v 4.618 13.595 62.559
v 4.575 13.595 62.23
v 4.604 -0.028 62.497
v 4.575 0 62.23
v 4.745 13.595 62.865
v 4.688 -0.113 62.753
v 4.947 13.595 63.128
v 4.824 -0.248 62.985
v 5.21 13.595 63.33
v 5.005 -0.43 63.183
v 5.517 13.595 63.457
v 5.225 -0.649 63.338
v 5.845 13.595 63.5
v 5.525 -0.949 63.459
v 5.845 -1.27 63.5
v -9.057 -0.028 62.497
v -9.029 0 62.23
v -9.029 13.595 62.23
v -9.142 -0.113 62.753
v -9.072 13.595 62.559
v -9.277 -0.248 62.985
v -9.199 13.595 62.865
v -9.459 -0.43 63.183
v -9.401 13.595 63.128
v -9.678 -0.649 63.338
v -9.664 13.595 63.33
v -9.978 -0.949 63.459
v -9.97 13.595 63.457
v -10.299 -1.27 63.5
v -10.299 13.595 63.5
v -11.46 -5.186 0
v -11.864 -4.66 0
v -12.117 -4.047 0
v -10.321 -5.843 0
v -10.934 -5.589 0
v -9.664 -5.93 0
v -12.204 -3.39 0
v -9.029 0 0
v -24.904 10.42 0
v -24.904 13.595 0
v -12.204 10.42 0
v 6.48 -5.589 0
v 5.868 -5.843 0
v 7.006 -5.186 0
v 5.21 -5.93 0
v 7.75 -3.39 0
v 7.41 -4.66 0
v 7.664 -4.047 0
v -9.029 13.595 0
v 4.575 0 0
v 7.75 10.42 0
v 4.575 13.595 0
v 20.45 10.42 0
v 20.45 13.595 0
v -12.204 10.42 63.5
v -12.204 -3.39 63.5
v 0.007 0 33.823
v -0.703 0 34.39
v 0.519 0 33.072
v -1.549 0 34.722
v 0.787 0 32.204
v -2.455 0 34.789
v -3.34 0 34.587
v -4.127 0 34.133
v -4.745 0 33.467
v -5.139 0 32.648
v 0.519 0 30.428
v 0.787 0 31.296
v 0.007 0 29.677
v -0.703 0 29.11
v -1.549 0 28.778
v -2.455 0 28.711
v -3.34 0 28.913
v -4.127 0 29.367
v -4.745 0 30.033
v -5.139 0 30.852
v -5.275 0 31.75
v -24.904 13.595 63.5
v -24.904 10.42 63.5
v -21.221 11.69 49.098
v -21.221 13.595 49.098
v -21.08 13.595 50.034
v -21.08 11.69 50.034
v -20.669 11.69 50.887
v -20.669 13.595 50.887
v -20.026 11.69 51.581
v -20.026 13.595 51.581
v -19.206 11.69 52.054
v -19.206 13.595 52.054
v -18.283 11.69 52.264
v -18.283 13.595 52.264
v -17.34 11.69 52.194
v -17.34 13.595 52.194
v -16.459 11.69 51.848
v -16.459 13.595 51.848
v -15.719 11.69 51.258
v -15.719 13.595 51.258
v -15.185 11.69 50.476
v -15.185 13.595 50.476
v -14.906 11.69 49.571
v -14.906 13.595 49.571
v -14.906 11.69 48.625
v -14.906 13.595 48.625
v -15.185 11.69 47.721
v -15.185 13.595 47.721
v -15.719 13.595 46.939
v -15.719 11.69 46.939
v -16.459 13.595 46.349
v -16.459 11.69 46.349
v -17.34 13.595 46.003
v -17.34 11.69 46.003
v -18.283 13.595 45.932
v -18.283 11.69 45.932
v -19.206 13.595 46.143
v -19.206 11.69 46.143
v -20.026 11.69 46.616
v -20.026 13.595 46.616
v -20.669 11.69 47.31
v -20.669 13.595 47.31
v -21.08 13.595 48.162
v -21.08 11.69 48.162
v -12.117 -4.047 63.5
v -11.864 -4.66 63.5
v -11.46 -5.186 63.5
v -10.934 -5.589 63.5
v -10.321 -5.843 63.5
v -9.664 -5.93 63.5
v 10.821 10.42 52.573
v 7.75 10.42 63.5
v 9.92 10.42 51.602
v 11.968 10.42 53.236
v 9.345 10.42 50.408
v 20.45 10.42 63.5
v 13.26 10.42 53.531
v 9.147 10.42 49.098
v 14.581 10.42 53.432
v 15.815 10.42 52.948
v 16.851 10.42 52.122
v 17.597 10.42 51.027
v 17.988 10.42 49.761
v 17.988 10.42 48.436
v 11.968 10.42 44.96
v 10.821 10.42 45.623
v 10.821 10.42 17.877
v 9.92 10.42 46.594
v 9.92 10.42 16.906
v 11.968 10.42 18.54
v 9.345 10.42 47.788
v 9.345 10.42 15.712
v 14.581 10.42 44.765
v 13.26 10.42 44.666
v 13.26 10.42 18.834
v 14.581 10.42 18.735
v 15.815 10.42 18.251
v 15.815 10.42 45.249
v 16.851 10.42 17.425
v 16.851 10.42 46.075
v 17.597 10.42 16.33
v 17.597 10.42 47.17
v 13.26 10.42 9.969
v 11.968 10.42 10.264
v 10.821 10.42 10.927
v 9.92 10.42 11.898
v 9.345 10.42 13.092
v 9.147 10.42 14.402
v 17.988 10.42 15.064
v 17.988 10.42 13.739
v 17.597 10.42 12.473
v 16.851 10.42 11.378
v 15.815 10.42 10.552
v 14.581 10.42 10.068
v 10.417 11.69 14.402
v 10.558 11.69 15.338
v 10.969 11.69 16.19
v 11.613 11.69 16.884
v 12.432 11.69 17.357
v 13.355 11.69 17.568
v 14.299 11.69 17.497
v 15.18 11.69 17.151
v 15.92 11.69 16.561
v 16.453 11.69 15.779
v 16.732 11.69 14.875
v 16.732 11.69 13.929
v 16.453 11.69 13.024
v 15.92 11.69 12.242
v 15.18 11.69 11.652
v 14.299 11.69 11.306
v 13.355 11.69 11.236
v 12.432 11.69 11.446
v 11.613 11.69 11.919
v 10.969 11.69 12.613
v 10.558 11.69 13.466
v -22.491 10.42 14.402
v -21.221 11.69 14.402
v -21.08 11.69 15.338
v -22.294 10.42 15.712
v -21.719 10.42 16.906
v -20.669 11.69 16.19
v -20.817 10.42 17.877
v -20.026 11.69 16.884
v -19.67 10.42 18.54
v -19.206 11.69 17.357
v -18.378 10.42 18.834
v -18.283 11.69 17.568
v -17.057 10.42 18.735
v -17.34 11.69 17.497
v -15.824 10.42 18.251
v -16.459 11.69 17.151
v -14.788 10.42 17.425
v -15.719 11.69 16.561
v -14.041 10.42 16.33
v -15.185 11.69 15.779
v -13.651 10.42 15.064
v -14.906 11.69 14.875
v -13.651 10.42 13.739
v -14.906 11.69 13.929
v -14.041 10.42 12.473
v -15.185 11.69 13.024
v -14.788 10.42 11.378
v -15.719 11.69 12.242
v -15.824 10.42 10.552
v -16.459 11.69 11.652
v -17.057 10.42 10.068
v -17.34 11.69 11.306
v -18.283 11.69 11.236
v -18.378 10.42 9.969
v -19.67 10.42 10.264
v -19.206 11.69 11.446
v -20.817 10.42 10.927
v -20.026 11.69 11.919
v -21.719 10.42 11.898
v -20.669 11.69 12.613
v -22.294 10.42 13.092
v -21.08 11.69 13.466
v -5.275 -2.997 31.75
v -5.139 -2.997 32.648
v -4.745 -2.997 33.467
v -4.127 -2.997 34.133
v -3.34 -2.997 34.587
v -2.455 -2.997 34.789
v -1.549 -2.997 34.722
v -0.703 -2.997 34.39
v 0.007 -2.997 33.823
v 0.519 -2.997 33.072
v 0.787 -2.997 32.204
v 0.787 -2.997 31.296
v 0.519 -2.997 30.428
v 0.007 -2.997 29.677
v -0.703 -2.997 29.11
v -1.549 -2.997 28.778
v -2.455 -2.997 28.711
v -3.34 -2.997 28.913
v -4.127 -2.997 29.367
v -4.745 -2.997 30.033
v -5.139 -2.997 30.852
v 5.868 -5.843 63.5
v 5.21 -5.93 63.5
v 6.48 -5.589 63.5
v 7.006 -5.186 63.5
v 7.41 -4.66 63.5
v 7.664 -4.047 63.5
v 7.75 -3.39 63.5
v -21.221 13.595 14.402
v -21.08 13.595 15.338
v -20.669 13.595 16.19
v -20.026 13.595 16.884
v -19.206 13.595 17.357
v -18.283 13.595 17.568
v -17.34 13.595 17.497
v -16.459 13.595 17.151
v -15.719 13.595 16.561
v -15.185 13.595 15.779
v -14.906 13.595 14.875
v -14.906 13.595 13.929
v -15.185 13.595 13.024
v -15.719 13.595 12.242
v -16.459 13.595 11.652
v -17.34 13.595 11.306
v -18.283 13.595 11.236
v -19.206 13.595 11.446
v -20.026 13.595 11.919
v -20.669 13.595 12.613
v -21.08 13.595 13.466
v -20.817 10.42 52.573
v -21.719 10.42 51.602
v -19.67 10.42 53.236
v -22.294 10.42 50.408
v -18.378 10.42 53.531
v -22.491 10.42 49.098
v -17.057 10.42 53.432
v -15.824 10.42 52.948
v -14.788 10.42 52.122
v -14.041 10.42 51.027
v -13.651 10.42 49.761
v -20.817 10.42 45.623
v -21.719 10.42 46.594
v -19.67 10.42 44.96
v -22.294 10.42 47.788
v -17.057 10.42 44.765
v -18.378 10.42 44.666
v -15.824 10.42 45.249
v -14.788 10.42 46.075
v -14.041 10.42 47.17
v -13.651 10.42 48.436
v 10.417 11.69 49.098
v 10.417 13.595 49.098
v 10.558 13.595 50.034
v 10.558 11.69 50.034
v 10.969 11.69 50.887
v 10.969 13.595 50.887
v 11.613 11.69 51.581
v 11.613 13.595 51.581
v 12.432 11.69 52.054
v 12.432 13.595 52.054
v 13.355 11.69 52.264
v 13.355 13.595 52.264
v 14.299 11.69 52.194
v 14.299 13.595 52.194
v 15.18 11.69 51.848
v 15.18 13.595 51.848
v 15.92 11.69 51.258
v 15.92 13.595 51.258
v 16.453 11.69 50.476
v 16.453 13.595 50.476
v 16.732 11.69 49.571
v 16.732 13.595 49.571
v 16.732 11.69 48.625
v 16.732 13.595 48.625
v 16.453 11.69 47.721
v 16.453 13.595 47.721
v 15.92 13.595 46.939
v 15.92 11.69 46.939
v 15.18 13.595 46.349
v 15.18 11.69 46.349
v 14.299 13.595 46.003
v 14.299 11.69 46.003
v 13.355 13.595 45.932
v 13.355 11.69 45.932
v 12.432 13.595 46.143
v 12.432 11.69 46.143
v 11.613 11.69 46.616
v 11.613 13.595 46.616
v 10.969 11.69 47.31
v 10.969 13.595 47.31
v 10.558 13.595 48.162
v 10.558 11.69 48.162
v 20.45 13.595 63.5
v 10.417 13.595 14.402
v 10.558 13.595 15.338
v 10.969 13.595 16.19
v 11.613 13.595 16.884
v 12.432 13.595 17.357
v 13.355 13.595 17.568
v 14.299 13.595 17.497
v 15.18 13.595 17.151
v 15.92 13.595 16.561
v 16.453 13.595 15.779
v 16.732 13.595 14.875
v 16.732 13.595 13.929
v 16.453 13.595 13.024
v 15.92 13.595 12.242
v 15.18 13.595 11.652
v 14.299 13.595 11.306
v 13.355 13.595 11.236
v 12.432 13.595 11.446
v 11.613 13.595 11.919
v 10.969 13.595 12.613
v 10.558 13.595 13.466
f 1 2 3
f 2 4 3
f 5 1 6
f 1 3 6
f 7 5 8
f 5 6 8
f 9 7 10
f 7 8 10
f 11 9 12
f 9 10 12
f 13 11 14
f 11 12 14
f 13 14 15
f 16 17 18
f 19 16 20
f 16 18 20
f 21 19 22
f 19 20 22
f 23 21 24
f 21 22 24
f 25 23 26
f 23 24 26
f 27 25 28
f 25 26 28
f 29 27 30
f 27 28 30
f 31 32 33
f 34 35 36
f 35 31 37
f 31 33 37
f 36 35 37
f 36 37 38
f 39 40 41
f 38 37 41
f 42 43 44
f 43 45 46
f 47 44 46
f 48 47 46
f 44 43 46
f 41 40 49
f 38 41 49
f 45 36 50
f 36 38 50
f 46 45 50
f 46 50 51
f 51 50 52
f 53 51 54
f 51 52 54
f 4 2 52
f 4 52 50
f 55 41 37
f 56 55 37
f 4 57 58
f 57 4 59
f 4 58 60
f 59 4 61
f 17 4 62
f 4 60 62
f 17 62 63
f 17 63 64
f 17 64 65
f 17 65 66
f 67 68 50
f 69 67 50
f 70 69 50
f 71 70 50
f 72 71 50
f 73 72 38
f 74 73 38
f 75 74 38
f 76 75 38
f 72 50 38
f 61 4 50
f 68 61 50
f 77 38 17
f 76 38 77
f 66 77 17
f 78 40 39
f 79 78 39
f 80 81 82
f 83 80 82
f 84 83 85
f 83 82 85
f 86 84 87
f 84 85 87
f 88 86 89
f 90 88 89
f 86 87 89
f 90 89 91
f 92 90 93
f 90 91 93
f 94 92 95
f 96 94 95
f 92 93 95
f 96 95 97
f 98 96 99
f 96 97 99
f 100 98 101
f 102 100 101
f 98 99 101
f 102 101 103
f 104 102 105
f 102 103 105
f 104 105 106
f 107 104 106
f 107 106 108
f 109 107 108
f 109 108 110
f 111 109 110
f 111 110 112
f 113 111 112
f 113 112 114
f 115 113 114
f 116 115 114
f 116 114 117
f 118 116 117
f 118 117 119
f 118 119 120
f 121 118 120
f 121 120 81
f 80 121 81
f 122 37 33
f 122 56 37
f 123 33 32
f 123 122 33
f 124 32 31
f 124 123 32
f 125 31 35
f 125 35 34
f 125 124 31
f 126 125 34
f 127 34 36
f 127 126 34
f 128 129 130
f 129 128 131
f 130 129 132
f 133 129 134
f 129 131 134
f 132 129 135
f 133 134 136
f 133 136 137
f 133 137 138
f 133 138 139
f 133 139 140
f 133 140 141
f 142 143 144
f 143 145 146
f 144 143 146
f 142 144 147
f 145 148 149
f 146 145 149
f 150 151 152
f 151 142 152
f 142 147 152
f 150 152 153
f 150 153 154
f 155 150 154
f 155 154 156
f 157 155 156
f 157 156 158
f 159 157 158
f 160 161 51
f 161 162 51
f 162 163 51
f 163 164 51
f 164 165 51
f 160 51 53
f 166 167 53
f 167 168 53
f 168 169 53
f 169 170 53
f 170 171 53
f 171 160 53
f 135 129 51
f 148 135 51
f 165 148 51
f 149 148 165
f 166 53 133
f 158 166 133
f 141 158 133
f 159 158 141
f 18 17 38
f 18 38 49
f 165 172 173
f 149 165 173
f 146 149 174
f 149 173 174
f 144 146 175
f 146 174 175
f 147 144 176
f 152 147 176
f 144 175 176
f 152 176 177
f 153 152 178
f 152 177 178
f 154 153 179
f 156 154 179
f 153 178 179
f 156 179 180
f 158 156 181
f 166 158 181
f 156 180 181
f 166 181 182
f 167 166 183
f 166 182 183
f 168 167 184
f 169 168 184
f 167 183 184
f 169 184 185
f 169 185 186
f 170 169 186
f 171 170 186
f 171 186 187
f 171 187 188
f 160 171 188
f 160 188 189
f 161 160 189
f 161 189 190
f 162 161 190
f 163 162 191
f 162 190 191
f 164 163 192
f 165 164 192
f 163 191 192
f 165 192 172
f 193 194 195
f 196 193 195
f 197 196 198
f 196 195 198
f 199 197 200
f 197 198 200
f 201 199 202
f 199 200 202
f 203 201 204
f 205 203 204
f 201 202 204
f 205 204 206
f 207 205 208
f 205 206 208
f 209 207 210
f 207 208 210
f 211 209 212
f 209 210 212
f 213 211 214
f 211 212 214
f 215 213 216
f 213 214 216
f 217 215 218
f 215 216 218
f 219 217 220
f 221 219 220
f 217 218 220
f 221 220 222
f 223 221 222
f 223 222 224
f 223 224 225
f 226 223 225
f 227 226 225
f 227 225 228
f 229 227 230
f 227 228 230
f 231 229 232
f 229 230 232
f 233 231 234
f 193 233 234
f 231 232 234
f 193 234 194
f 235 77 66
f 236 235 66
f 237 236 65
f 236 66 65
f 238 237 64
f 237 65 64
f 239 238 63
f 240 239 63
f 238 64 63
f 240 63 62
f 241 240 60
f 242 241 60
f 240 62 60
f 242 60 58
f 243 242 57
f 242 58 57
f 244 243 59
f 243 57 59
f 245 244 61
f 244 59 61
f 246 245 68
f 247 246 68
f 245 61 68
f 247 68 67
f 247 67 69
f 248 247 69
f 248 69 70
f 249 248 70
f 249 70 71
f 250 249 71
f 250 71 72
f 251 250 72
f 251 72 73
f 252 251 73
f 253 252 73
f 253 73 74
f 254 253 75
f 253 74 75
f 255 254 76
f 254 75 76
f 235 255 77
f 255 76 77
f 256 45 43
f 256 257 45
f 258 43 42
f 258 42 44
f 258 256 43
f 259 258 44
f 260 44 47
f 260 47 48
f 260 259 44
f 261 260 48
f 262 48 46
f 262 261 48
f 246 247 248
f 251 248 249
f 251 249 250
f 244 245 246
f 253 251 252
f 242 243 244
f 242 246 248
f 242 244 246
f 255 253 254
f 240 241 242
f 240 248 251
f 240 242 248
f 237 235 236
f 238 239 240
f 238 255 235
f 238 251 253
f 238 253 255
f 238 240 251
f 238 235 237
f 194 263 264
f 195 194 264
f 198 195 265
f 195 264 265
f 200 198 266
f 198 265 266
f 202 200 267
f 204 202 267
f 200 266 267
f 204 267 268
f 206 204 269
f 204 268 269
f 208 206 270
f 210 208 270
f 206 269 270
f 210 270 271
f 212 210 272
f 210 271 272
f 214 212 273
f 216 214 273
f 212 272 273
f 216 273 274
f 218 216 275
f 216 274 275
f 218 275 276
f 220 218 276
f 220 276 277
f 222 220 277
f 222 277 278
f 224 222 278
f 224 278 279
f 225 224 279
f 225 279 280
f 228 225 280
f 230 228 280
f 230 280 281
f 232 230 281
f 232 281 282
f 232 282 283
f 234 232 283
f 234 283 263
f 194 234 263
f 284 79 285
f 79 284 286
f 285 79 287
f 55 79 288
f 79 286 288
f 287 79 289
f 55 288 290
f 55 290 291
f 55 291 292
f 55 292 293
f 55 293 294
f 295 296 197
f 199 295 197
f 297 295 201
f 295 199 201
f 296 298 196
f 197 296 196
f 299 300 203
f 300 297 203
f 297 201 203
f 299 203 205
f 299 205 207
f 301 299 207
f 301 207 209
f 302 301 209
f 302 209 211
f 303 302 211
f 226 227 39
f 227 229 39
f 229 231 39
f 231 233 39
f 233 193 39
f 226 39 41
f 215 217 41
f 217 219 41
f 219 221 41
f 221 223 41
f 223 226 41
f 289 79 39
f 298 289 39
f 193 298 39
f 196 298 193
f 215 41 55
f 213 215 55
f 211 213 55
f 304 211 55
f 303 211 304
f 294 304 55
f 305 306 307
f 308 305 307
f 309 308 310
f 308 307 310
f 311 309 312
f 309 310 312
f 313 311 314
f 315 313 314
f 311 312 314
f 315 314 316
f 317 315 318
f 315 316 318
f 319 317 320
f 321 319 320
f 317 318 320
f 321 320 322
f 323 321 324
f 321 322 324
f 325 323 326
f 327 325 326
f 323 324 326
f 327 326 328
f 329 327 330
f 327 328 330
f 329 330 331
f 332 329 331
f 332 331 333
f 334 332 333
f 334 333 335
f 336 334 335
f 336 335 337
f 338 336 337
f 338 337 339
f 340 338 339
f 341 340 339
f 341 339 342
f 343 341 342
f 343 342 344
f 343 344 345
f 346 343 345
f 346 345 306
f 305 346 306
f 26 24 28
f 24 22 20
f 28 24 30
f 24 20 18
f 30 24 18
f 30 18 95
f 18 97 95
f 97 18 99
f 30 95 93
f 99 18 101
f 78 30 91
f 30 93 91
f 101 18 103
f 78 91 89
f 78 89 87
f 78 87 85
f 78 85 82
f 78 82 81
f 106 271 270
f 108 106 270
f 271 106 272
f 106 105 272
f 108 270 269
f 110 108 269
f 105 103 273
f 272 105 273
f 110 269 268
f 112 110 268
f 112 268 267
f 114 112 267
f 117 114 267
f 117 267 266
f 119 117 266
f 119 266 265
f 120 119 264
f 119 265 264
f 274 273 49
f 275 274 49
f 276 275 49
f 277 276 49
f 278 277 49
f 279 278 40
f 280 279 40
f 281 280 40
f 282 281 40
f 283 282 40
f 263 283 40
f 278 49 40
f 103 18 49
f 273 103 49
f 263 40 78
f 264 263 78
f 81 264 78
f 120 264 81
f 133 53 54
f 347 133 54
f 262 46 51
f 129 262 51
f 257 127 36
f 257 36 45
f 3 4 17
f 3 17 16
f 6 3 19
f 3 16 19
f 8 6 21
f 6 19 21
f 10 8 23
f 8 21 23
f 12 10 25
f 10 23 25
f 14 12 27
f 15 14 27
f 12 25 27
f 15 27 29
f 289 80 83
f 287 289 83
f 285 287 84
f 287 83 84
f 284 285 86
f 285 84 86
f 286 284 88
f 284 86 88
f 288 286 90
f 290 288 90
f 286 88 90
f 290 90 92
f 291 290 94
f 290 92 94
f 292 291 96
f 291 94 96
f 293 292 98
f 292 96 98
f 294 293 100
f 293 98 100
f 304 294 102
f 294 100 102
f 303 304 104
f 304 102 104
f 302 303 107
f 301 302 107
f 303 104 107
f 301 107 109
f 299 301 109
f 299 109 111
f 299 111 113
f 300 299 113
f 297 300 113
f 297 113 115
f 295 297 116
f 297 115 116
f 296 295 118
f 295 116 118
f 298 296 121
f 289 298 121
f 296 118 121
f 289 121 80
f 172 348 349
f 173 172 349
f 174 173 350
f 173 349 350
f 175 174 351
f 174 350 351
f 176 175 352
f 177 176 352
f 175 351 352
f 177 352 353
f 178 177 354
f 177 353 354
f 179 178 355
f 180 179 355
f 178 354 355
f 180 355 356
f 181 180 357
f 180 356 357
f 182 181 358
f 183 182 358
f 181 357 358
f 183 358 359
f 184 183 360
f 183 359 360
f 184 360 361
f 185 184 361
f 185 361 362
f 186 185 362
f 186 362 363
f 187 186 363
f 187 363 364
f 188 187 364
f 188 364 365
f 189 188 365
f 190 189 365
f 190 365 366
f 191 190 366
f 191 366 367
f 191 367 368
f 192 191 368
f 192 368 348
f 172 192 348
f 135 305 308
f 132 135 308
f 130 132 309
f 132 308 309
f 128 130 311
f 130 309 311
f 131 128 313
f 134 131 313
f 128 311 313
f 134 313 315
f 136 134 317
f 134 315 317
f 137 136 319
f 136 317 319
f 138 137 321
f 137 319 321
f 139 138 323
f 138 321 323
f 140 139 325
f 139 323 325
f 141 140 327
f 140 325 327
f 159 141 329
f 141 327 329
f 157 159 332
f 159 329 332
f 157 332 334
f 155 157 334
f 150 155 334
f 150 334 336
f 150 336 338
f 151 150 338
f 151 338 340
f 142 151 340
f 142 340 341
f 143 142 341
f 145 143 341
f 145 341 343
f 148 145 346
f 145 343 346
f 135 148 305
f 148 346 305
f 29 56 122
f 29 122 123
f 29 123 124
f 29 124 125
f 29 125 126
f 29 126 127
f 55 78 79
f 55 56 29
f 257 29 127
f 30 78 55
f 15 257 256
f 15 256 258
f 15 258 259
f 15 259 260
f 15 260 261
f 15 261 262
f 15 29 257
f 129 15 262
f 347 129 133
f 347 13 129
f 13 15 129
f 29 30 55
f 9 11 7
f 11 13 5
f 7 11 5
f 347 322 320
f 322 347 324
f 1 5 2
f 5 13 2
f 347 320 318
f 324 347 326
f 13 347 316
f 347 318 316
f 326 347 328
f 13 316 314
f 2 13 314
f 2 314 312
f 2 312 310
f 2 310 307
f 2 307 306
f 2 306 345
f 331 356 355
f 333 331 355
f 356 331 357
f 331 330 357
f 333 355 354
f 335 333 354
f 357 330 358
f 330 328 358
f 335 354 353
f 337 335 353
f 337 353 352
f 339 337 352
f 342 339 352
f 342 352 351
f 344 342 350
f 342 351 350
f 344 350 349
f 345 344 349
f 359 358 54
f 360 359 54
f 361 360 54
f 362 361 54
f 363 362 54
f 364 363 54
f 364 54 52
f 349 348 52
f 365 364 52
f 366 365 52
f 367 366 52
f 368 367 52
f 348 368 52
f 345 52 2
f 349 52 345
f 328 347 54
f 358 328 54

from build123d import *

# Parameters (mm, degrees)
F1_DEPTH = 63.5
F2_R     = 3.048
F3_DEPTH = 2.9972
F5_R     = 3.175
F4_R     = 3.175
F6_DEPTH = 25.4
F7_SIZE  = 1.27
F8_R     = 2.54
F9_R     = 1.27


with BuildPart() as f1:
    # F0 (on Top) → F1 (new body)
    with BuildSketch(Plane.XY):
        Polygon((4.5752139781, 0), (-9.0290260219, 0), (-9.0290260219, 13.59535), (-24.9040260219, 13.59535), (-24.9040260219, 10.42035), (-12.2040260219, 10.42035), (-12.2040260219, -5.92963), (7.7502139781, -5.92963), (7.7502139781, 10.42035), (20.4502139781, 10.42035), (20.4502139781, 13.59535), (4.5752139781, 13.59535), align=None)
    extrude(amount=F1_DEPTH)

    # F2 (on face) → F3 (cut)
    with BuildSketch(Plane(origin=(0, 0, 0), x_dir=(-1, 0, 0), z_dir=(0, 1, 0))):
        with Locations((2.2269060219, 31.75)):
            Circle(F2_R)
    extrude(amount=-F3_DEPTH, mode=Mode.SUBTRACT)

    # F5 (on face) + F4 (on face) → F6 (cut)
    with BuildSketch(Plane(origin=(0, 13.59535, 0), x_dir=(-1, 0, 0), z_dir=(0, 1, 0))):
        with Locations((-13.5922139781, 49.0982)):
            Circle(F5_R)
        with Locations((-13.5922139781, 14.4018)):
            Circle(F5_R)
    with BuildSketch(Plane(origin=(0, 13.59535, 0), x_dir=(-1, 0, 0), z_dir=(0, 1, 0))):
        with Locations((18.0460260219, 49.0982)):
            Circle(F4_R)
        with Locations((18.0460260219, 14.4018)):
            Circle(F4_R)
    extrude(amount=-F6_DEPTH, mode=Mode.SUBTRACT)

    # F7
    f7_edges = [f1.edges().sort_by_distance(p)[0] for p in [
        (-14.871026, 10.42035, 49.0982),
        (-14.871026, 10.42035, 14.4018),
        (16.767214, 10.42035, 49.0982),
        (16.767214, 10.42035, 14.4018),
    ]]
    chamfer(f7_edges, length=F7_SIZE)

    # F8
    f8_edges = [f1.edges().sort_by_distance(p)[0] for p in [
        (7.750214, -5.92963, 31.75),
        (-12.204026, -5.92963, 31.75),
    ]]
    fillet(f8_edges, radius=F8_R)

    # F9
    f9_edges = [f1.edges().sort_by_distance(p)[0] for p in [
        (-9.029026, 6.797675, 63.5),
        (4.575214, 6.797675, 63.5),
        (-2.226906, 0, 63.5),
    ]]
    fillet(f9_edges, radius=F9_R)


solid = f1.part
